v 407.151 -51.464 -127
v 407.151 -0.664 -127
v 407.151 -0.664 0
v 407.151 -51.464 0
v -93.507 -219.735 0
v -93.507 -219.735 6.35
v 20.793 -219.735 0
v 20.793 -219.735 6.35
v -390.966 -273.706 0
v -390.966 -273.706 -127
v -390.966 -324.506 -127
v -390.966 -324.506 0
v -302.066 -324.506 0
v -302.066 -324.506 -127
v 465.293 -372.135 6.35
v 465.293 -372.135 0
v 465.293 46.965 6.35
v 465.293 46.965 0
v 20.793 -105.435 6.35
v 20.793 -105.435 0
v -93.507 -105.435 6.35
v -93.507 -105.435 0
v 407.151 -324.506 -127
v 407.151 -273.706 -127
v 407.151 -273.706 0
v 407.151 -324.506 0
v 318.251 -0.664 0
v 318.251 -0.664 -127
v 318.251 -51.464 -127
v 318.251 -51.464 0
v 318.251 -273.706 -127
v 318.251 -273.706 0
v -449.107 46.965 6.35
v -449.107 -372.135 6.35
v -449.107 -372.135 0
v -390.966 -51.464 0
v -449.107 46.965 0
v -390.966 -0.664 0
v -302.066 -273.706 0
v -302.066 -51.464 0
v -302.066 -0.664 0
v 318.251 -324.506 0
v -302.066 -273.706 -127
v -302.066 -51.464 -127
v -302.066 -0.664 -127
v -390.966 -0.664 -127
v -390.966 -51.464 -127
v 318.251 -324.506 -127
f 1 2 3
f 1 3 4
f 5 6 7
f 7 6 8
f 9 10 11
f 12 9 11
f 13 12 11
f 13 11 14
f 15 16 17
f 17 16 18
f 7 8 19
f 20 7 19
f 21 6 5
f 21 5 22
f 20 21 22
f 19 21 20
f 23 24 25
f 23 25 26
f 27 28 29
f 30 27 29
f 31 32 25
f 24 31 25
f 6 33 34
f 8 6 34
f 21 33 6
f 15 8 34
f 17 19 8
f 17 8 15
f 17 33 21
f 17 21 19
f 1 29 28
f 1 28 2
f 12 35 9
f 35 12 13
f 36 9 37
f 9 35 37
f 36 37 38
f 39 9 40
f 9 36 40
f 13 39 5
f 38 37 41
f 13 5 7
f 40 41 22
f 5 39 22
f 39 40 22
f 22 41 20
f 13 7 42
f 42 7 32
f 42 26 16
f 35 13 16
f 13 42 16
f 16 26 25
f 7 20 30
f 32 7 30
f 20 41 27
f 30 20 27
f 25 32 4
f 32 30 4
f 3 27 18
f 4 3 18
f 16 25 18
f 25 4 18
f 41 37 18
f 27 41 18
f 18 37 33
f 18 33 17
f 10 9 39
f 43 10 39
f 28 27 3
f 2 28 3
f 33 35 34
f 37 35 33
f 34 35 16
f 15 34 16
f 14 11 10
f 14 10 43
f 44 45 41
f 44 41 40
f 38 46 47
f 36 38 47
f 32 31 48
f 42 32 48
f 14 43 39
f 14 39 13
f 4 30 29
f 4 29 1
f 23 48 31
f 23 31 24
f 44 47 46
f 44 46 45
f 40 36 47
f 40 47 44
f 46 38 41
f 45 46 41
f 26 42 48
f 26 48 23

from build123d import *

# Parameters (mm, degrees)
F0_W     = 914.4
F0_H     = 419.1
F1_DEPTH = 6.35
F2_W     = 88.9
F2_H     = 50.8
F3_DEPTH = 127
F4_W     = 114.3
F4_H     = 114.3
F5_DEPTH = 6.35


with BuildPart() as f1:
    # F0 (on Top) → F1 (new body)
    with BuildSketch(Plane.XY):
        with Locations((8.092676, -162.5851)):
            Rectangle(F0_W, F0_H)
    extrude(amount=F1_DEPTH)

    # F2 (on face) → F3 (join)
    with BuildSketch(Plane(origin=(0, 0, 0), x_dir=(1, 0, 0), z_dir=(0, 0, -1))):
        with Locations((-346.515909, 299.105746)):
            Rectangle(F2_W, F2_H)
        with Locations((-346.515909, 26.064454)):
            Rectangle(F2_W, F2_H)
        with Locations((362.701261, 299.105746)):
            Rectangle(F2_W, F2_H)
        with Locations((362.701261, 26.064454)):
            Rectangle(F2_W, F2_H)
    extrude(amount=F3_DEPTH)

    # F4 (on face) → F5 (cut)
    with BuildSketch(Plane.XY.offset(6.35)):
        with Locations((-36.357324, -162.5851)):
            Rectangle(F4_W, F4_H)
    extrude(amount=-F5_DEPTH, mode=Mode.SUBTRACT)


solid = f1.part
